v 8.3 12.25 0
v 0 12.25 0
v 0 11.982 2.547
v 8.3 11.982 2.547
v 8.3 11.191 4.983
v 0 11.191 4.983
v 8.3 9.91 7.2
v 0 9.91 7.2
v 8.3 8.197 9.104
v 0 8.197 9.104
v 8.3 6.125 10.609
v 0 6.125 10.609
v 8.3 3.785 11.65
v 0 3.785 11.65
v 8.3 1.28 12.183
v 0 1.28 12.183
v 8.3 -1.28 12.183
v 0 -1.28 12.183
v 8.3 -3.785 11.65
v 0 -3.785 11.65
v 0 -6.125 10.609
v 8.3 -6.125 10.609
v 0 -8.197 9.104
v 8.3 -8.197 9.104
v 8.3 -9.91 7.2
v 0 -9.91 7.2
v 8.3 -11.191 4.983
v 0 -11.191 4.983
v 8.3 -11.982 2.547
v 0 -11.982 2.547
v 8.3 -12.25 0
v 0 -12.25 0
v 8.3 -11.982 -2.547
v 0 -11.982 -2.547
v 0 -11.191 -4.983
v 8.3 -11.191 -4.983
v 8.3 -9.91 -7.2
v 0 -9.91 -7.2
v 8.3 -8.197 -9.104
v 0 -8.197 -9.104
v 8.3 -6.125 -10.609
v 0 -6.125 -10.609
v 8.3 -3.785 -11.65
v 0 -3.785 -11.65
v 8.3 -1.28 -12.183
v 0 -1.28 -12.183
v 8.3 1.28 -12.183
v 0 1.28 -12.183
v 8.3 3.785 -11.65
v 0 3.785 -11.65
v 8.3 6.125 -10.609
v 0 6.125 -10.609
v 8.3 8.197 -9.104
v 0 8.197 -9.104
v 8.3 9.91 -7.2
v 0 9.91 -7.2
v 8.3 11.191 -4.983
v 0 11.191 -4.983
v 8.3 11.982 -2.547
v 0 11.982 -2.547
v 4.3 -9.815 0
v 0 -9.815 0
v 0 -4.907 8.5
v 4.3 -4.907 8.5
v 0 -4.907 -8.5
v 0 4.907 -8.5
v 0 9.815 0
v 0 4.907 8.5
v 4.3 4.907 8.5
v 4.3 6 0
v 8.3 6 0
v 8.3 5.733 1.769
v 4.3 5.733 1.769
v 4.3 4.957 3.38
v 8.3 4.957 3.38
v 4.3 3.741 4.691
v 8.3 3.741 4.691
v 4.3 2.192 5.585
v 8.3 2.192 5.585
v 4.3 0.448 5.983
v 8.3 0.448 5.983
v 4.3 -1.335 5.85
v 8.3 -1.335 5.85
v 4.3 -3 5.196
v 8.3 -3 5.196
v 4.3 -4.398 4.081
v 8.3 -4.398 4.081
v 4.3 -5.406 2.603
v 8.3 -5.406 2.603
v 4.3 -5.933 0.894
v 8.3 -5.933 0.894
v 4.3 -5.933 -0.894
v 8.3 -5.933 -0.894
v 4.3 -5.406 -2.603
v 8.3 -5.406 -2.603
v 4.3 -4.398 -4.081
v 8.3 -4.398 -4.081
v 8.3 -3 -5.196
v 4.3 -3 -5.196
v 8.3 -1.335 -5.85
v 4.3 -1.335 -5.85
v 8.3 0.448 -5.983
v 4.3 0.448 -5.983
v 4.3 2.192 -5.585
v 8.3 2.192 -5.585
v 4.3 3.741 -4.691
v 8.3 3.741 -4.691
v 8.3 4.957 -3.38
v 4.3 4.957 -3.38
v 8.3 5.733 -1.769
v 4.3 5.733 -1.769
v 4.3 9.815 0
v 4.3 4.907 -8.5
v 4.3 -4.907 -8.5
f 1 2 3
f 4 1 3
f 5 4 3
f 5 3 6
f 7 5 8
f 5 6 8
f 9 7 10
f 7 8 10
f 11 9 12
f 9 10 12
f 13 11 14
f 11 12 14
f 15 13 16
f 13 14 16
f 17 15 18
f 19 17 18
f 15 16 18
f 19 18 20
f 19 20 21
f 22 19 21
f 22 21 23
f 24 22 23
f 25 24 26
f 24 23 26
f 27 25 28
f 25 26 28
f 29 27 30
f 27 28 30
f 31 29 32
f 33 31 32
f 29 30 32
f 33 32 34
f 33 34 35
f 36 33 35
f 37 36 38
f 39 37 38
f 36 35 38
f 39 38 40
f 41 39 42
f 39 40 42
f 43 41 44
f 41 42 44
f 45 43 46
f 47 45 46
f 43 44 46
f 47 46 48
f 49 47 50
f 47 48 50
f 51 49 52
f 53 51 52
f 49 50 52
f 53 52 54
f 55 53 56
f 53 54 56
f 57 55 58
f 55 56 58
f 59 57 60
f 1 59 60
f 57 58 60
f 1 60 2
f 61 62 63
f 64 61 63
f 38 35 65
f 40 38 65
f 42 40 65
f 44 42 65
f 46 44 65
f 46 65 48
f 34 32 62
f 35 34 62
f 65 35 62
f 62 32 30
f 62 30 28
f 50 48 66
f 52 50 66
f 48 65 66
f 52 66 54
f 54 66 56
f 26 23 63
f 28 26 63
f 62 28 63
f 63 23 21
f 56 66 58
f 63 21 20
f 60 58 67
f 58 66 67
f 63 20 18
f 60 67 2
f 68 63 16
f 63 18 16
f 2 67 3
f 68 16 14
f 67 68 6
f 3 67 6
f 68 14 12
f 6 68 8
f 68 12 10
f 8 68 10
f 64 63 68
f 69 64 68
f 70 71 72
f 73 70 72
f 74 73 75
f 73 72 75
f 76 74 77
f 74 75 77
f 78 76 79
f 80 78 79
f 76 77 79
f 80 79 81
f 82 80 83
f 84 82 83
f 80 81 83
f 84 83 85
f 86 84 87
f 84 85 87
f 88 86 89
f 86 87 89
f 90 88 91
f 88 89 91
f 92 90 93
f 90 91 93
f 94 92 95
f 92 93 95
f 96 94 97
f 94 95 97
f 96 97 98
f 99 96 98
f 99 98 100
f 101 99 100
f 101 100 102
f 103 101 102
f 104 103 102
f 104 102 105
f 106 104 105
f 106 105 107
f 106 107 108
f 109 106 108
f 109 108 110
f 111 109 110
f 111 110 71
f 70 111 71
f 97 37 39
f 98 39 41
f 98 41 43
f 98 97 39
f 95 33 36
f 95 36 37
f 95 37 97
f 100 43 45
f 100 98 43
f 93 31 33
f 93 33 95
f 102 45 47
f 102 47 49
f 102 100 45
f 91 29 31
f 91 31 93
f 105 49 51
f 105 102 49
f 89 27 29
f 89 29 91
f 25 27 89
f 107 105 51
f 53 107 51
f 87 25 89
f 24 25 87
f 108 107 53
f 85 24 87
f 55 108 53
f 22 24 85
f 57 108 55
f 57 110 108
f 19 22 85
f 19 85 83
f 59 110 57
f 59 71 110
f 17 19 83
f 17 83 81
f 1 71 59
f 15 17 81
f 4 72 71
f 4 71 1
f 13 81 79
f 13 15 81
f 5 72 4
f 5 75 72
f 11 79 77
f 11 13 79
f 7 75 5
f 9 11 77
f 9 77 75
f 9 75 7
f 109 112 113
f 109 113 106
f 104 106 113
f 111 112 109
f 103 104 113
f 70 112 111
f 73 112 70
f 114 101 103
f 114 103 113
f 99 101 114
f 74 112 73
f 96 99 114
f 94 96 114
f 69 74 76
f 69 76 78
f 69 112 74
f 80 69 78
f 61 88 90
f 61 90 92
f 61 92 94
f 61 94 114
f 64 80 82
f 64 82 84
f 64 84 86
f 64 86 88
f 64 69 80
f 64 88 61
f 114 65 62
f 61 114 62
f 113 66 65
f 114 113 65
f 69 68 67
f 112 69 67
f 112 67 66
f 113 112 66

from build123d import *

# Parameters (mm, degrees)
F0_R     = 12.25
F1_DEPTH = 8.3
F2_R     = 6
F3_DEPTH = 8.301
F5_DEPTH = 4.3


with BuildPart() as f1:
    # F0 (on Right) → F1 (new body)
    with BuildSketch(Plane.YZ):
        Circle(F0_R)
    extrude(amount=F1_DEPTH)

    # F2 (on face) → F3 (cut, through all)
    with BuildSketch(Plane.YZ.offset(8.3)):
        Circle(F2_R)
    extrude(amount=-F3_DEPTH, mode=Mode.SUBTRACT)

    # F4 (on face) → F5 (cut)
    with BuildSketch(Plane(origin=(0, 0, 0), x_dir=(0, -1, 0), z_dir=(-1, 0, 0))):
        Polygon((4.907477, 8.5), (-4.907477, 8.5), (-9.814955, 0), (-4.907477, -8.5), (4.907477, -8.5), (9.814955, 0), align=None)
    extrude(amount=-F5_DEPTH, mode=Mode.SUBTRACT)


solid = f1.part
